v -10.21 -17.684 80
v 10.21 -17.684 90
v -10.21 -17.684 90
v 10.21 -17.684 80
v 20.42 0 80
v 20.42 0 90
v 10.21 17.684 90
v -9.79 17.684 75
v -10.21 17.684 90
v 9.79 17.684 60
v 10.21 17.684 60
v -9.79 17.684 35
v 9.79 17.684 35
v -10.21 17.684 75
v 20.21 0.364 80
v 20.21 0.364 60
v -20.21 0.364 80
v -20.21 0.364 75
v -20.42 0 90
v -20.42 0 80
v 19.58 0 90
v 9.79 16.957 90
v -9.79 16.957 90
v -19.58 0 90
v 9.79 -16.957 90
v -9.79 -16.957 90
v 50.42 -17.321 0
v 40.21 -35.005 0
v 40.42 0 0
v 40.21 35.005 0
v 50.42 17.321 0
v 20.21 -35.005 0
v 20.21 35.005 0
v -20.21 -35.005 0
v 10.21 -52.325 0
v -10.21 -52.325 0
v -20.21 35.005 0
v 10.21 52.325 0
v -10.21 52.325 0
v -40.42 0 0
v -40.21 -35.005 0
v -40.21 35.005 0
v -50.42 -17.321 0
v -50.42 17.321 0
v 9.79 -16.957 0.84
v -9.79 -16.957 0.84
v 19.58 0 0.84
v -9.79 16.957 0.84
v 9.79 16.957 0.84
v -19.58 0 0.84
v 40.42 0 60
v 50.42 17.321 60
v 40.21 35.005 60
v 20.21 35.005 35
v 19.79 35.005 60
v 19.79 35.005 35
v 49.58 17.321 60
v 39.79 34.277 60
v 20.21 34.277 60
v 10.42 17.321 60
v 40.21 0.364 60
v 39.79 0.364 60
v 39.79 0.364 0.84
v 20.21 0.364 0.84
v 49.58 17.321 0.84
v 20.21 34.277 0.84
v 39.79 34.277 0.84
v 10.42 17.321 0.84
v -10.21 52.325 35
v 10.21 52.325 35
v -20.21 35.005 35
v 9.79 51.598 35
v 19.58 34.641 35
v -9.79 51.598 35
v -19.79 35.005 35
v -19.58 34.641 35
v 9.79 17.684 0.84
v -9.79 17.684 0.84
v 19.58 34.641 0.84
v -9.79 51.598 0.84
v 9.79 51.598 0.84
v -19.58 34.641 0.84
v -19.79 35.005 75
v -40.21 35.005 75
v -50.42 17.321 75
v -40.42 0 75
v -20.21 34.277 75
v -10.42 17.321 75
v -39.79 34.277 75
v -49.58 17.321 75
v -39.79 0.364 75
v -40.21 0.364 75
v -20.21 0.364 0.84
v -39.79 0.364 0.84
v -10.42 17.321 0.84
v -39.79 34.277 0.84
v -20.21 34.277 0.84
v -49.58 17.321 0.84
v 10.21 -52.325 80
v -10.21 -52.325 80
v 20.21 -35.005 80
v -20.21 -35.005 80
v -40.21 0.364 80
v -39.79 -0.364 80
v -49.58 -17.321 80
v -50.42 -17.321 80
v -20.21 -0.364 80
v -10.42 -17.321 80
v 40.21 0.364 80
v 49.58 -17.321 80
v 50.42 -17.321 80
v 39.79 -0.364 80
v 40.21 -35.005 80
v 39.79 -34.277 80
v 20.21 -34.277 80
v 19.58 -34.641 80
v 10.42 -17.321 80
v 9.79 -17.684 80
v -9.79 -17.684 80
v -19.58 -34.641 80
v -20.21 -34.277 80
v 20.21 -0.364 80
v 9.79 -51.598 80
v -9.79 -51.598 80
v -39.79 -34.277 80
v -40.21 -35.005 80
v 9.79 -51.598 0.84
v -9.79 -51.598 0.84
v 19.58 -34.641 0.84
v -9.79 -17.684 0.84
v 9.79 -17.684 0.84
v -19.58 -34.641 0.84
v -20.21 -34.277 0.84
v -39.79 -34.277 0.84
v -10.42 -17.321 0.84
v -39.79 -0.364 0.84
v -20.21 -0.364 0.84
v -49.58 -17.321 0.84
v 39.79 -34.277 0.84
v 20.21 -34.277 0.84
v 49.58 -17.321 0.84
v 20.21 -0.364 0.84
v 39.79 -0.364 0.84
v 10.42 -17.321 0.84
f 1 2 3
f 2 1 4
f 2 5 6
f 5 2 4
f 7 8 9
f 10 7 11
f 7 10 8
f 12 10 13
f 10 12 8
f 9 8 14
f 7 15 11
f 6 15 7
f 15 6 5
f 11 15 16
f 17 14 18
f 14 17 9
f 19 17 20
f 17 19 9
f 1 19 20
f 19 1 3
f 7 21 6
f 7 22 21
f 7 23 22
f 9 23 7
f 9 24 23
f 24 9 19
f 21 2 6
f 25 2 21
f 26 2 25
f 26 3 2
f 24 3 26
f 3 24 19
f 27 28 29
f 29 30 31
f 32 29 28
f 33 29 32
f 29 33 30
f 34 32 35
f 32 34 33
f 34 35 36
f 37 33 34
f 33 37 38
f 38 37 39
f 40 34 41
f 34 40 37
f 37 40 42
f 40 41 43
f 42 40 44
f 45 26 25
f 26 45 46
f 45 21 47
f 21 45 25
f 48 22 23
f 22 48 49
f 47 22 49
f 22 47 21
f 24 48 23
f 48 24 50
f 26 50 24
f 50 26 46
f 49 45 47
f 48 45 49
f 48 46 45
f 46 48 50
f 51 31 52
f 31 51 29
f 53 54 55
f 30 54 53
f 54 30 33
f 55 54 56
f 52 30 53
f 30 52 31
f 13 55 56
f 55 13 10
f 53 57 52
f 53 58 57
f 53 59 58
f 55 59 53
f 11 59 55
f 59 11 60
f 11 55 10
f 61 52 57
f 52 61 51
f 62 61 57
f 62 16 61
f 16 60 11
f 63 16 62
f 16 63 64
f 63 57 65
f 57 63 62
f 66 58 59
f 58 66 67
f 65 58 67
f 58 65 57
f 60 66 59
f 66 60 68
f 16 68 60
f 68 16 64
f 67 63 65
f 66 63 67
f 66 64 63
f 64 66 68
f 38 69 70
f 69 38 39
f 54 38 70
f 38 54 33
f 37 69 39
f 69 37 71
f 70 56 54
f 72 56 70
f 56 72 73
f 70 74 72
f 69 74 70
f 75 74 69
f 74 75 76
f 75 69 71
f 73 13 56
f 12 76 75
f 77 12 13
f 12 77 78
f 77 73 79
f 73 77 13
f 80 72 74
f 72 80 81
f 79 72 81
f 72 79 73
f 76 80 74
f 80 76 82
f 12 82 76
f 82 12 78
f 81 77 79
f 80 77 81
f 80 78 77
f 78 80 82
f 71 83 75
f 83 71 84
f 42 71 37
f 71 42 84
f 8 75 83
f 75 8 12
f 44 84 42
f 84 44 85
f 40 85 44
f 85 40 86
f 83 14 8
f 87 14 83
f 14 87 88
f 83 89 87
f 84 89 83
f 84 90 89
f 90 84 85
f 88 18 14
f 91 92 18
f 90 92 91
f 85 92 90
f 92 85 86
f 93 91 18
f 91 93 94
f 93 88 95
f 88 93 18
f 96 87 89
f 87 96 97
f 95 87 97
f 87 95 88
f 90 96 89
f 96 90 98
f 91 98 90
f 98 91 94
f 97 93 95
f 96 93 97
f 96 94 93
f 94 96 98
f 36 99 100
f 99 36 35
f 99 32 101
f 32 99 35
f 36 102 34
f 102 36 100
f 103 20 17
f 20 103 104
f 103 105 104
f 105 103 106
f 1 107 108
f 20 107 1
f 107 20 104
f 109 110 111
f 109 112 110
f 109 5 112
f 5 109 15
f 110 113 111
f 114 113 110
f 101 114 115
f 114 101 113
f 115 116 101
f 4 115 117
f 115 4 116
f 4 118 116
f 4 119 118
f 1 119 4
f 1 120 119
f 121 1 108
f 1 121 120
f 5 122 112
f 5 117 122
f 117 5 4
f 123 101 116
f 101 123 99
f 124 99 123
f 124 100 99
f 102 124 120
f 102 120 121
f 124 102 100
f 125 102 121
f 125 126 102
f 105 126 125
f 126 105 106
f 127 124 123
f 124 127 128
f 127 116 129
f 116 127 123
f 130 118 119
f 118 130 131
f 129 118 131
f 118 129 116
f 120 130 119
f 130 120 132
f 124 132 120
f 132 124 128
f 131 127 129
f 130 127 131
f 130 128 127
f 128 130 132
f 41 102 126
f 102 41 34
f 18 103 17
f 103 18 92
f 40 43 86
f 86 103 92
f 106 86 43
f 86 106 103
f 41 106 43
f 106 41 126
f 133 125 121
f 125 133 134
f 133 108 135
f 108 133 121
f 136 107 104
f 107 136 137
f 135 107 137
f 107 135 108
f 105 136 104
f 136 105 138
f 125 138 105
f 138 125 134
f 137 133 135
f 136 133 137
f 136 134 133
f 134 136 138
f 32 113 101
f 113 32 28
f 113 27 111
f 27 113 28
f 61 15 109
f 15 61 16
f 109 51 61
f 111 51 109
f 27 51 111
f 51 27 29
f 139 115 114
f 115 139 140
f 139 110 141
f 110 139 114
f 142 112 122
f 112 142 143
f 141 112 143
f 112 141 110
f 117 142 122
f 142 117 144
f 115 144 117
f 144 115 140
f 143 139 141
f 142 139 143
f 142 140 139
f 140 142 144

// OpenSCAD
//radius of hex
radius = 20 ;

//shell thickness
shell_thickness =0.84 ;

//height of central hex
central_hex_height = 90 ;

//height of North East hex
NE_hex_height = 60 ;

//height of North hex
N_hex_height = 35 ;

//height of North West hex
NW_hex_height = 75 ;

//height of South West hex
SW_hex_height = 80 ;

//height of South hex
S_hex_height = 80 ;

//height of South East hex
SE_hex_height = 80 ;



module pot_hexa(h,r,shell) {
	difference (){
        cylinder(h,r,r,$fn=6);  
        translate([0,0,shell])
        cylinder(h,r-shell,r-shell,$fn=6);
}
};



module marguerite(h,r,shell,face1,face2,face3,face4,face5,face6) {

//centre    
    pot_hexa(h,r+shell_thickness/2,shell) ;

if (face1>0) {
    translate([3/2*r,r*sqrt(3)/2,0])
    pot_hexa(face1,r+shell_thickness/2,shell) ;
}

if (face2>0) {
    translate([00,sqrt(3)*r,0])
    pot_hexa(face2,r+shell_thickness/2,shell) ;
}
if (face3>0) {
    translate([-3/2*r,r*sqrt(3)/2,0])
    pot_hexa(face3,r+shell_thickness/2,shell) ;
}

if (face4>0) {
    translate([00,-sqrt(3)*r,0])
    pot_hexa(face4,r+shell_thickness/2,shell) ;
}
if (face5>0) {
    translate([-3/2*r,-r*sqrt(3)/2,0])
    pot_hexa(face5,r+shell_thickness/2,shell) ;
}

if (face6>0) {
    translate([3/2*r,-r*sqrt(3)/2,0])
    pot_hexa(face6,r+shell_thickness/2,shell) ;
}
    }

marguerite(central_hex_height,radius,shell_thickness,NE_hex_height,N_hex_height,NW_hex_height,SW_hex_height,S_hex_height,SE_hex_height) ;
